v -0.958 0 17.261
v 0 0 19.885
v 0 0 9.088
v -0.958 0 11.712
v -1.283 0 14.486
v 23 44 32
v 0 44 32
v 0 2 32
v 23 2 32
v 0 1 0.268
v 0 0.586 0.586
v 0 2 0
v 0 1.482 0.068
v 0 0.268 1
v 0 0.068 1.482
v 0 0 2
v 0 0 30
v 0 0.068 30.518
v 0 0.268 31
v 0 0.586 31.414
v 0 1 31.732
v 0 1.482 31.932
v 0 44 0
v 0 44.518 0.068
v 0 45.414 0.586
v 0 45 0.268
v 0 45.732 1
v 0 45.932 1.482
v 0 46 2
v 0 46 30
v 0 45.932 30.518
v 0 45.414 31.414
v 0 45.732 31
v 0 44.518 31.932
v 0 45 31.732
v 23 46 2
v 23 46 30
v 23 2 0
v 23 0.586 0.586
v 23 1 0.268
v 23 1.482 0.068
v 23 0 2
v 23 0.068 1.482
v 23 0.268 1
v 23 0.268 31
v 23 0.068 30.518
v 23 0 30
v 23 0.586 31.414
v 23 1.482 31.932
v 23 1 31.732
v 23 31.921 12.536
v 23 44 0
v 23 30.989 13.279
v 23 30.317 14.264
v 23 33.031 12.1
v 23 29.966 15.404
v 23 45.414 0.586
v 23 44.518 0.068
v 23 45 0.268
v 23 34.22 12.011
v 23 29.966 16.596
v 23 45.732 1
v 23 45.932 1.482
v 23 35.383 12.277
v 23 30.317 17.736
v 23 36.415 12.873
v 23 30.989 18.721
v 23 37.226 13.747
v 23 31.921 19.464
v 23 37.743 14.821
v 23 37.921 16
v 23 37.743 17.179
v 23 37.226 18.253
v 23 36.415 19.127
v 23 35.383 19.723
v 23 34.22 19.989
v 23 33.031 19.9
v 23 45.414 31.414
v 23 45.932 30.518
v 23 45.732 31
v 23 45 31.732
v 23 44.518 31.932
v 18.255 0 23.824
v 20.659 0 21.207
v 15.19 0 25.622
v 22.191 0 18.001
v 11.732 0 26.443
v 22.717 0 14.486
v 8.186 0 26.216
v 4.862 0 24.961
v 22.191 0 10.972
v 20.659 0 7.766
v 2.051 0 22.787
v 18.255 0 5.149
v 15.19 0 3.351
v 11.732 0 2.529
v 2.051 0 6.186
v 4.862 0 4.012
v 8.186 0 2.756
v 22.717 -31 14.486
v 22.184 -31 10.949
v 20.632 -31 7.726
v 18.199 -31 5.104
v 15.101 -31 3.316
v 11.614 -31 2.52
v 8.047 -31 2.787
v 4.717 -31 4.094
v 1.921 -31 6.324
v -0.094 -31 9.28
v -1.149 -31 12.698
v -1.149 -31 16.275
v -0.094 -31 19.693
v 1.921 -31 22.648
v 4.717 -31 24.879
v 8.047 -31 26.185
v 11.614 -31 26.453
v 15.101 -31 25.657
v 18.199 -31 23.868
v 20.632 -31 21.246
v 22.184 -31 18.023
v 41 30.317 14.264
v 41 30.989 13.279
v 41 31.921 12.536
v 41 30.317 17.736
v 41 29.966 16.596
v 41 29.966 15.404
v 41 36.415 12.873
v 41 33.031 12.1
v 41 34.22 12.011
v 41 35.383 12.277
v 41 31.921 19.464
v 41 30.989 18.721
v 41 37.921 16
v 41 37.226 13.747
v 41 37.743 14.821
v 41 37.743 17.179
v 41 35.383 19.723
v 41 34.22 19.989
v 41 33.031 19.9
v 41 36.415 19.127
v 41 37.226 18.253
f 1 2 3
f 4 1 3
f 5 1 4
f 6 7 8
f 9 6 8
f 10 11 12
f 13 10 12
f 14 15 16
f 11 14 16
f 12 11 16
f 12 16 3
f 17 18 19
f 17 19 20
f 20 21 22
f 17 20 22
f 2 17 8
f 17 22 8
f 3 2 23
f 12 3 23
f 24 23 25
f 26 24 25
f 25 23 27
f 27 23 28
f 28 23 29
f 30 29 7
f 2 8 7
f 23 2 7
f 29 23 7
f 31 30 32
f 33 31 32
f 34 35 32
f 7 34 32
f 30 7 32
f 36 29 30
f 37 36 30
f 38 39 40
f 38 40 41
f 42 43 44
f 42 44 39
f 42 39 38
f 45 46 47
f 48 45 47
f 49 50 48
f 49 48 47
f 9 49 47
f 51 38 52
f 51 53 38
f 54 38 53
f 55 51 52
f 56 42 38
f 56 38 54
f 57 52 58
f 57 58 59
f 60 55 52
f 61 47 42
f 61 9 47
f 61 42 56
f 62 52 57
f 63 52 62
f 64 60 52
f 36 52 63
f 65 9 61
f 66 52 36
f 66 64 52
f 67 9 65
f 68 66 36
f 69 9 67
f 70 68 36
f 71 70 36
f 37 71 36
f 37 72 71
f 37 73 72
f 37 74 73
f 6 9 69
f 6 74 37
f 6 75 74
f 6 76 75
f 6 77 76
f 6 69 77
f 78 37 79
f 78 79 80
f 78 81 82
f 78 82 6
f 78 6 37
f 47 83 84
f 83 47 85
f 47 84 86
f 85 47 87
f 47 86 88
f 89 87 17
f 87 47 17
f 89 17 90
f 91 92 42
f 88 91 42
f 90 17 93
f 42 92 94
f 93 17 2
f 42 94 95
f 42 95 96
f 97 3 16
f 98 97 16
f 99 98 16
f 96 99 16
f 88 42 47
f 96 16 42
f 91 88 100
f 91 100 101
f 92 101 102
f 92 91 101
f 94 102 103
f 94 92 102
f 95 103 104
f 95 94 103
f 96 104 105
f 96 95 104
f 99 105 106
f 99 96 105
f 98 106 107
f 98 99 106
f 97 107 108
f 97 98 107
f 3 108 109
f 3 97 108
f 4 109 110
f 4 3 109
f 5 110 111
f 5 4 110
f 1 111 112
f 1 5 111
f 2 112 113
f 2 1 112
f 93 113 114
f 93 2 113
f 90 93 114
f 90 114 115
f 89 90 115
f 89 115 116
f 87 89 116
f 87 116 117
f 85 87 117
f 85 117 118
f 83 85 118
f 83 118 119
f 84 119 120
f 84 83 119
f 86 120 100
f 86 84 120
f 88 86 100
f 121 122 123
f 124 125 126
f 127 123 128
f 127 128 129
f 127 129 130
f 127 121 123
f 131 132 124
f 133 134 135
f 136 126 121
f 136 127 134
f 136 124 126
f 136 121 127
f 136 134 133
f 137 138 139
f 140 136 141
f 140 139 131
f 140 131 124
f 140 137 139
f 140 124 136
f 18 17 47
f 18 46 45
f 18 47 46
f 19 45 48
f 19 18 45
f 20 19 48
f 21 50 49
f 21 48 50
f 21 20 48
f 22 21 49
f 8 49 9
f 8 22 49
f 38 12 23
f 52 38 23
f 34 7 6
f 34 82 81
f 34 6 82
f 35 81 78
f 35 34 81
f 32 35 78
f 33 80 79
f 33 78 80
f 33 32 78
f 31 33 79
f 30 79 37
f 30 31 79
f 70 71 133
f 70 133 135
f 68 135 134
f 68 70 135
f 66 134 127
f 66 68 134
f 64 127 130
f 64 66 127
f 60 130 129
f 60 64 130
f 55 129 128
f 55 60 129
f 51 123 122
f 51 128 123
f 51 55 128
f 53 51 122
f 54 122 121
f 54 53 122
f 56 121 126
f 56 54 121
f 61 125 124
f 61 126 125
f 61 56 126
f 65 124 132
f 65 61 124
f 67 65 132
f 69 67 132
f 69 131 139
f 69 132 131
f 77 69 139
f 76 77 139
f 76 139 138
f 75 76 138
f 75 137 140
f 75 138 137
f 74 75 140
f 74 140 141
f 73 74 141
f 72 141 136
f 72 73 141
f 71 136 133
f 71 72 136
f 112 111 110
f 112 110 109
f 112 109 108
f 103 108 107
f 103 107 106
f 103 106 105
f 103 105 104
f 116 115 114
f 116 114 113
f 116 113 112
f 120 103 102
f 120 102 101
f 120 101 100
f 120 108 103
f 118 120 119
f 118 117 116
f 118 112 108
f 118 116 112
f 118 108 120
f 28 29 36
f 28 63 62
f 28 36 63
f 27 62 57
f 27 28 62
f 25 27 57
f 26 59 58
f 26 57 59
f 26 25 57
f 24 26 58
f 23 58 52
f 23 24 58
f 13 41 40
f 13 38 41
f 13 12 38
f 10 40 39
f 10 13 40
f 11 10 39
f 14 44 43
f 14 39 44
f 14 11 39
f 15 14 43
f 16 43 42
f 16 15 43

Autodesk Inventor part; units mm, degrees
ref_plane "YZ Plane" through (0, 0, 0) normal (1, 0, 0) x (0, 1, 0)
ref_plane "XZ Plane" through (0, 0, 0) normal (0, 1, 0) x (-1, 0, 0)
ref_plane "XY Plane" through (0, 0, 0) normal (0, 0, 1) x (1, 0, 0)
sketch "Sketch1" plane through (0, 0, 0) normal (1, 0, 0) x (0, 1, 0)
  line L0 (2, 0) -> (44, 0)
  line L1 (46, 2) -> (46, 30)
  line L2 (44, 32) -> (2, 32)
  line L3 (0, 30) -> (0, 2)
  arc A0 (2, 32) -> (0, 30) centre (2, 30) ccw
  arc A1 (46, 30) -> (44, 32) centre (44, 30) ccw
  arc A2 (44, 0) -> (46, 2) centre (44, 2) ccw
  arc A3 (0, 2) -> (2, 0) centre (2, 2) ccw
  line L4 (55.8524, 16) -> (-12.4215, 16) construction
  circle A4 centre (33.9212, 16) radius 4
  point P0 (0, 0)
  dimension "d3" = 8
extrude "Extrusion1" add sketch "Sketch1" along normal blind 23
extrude "Extrusion2" add sketch "Sketch1" along normal blind 41 contours A4
sketch "Sketch2" plane through (0, 0, 2) normal (0, -1, 0) x (1, 0, 0)
  line L0 (41, 10) -> (41, 18) projected
  line L1 (41, 14) -> (-14.7387, 14) construction
  circle A0 centre (10.7172, 12.4863) radius 12
  point P0 (0, -2)
  dimension "d12" = 24
extrude "Extrusion3" add sketch "Sketch2" along normal blind 31
properties part number "MOTOR 2"
